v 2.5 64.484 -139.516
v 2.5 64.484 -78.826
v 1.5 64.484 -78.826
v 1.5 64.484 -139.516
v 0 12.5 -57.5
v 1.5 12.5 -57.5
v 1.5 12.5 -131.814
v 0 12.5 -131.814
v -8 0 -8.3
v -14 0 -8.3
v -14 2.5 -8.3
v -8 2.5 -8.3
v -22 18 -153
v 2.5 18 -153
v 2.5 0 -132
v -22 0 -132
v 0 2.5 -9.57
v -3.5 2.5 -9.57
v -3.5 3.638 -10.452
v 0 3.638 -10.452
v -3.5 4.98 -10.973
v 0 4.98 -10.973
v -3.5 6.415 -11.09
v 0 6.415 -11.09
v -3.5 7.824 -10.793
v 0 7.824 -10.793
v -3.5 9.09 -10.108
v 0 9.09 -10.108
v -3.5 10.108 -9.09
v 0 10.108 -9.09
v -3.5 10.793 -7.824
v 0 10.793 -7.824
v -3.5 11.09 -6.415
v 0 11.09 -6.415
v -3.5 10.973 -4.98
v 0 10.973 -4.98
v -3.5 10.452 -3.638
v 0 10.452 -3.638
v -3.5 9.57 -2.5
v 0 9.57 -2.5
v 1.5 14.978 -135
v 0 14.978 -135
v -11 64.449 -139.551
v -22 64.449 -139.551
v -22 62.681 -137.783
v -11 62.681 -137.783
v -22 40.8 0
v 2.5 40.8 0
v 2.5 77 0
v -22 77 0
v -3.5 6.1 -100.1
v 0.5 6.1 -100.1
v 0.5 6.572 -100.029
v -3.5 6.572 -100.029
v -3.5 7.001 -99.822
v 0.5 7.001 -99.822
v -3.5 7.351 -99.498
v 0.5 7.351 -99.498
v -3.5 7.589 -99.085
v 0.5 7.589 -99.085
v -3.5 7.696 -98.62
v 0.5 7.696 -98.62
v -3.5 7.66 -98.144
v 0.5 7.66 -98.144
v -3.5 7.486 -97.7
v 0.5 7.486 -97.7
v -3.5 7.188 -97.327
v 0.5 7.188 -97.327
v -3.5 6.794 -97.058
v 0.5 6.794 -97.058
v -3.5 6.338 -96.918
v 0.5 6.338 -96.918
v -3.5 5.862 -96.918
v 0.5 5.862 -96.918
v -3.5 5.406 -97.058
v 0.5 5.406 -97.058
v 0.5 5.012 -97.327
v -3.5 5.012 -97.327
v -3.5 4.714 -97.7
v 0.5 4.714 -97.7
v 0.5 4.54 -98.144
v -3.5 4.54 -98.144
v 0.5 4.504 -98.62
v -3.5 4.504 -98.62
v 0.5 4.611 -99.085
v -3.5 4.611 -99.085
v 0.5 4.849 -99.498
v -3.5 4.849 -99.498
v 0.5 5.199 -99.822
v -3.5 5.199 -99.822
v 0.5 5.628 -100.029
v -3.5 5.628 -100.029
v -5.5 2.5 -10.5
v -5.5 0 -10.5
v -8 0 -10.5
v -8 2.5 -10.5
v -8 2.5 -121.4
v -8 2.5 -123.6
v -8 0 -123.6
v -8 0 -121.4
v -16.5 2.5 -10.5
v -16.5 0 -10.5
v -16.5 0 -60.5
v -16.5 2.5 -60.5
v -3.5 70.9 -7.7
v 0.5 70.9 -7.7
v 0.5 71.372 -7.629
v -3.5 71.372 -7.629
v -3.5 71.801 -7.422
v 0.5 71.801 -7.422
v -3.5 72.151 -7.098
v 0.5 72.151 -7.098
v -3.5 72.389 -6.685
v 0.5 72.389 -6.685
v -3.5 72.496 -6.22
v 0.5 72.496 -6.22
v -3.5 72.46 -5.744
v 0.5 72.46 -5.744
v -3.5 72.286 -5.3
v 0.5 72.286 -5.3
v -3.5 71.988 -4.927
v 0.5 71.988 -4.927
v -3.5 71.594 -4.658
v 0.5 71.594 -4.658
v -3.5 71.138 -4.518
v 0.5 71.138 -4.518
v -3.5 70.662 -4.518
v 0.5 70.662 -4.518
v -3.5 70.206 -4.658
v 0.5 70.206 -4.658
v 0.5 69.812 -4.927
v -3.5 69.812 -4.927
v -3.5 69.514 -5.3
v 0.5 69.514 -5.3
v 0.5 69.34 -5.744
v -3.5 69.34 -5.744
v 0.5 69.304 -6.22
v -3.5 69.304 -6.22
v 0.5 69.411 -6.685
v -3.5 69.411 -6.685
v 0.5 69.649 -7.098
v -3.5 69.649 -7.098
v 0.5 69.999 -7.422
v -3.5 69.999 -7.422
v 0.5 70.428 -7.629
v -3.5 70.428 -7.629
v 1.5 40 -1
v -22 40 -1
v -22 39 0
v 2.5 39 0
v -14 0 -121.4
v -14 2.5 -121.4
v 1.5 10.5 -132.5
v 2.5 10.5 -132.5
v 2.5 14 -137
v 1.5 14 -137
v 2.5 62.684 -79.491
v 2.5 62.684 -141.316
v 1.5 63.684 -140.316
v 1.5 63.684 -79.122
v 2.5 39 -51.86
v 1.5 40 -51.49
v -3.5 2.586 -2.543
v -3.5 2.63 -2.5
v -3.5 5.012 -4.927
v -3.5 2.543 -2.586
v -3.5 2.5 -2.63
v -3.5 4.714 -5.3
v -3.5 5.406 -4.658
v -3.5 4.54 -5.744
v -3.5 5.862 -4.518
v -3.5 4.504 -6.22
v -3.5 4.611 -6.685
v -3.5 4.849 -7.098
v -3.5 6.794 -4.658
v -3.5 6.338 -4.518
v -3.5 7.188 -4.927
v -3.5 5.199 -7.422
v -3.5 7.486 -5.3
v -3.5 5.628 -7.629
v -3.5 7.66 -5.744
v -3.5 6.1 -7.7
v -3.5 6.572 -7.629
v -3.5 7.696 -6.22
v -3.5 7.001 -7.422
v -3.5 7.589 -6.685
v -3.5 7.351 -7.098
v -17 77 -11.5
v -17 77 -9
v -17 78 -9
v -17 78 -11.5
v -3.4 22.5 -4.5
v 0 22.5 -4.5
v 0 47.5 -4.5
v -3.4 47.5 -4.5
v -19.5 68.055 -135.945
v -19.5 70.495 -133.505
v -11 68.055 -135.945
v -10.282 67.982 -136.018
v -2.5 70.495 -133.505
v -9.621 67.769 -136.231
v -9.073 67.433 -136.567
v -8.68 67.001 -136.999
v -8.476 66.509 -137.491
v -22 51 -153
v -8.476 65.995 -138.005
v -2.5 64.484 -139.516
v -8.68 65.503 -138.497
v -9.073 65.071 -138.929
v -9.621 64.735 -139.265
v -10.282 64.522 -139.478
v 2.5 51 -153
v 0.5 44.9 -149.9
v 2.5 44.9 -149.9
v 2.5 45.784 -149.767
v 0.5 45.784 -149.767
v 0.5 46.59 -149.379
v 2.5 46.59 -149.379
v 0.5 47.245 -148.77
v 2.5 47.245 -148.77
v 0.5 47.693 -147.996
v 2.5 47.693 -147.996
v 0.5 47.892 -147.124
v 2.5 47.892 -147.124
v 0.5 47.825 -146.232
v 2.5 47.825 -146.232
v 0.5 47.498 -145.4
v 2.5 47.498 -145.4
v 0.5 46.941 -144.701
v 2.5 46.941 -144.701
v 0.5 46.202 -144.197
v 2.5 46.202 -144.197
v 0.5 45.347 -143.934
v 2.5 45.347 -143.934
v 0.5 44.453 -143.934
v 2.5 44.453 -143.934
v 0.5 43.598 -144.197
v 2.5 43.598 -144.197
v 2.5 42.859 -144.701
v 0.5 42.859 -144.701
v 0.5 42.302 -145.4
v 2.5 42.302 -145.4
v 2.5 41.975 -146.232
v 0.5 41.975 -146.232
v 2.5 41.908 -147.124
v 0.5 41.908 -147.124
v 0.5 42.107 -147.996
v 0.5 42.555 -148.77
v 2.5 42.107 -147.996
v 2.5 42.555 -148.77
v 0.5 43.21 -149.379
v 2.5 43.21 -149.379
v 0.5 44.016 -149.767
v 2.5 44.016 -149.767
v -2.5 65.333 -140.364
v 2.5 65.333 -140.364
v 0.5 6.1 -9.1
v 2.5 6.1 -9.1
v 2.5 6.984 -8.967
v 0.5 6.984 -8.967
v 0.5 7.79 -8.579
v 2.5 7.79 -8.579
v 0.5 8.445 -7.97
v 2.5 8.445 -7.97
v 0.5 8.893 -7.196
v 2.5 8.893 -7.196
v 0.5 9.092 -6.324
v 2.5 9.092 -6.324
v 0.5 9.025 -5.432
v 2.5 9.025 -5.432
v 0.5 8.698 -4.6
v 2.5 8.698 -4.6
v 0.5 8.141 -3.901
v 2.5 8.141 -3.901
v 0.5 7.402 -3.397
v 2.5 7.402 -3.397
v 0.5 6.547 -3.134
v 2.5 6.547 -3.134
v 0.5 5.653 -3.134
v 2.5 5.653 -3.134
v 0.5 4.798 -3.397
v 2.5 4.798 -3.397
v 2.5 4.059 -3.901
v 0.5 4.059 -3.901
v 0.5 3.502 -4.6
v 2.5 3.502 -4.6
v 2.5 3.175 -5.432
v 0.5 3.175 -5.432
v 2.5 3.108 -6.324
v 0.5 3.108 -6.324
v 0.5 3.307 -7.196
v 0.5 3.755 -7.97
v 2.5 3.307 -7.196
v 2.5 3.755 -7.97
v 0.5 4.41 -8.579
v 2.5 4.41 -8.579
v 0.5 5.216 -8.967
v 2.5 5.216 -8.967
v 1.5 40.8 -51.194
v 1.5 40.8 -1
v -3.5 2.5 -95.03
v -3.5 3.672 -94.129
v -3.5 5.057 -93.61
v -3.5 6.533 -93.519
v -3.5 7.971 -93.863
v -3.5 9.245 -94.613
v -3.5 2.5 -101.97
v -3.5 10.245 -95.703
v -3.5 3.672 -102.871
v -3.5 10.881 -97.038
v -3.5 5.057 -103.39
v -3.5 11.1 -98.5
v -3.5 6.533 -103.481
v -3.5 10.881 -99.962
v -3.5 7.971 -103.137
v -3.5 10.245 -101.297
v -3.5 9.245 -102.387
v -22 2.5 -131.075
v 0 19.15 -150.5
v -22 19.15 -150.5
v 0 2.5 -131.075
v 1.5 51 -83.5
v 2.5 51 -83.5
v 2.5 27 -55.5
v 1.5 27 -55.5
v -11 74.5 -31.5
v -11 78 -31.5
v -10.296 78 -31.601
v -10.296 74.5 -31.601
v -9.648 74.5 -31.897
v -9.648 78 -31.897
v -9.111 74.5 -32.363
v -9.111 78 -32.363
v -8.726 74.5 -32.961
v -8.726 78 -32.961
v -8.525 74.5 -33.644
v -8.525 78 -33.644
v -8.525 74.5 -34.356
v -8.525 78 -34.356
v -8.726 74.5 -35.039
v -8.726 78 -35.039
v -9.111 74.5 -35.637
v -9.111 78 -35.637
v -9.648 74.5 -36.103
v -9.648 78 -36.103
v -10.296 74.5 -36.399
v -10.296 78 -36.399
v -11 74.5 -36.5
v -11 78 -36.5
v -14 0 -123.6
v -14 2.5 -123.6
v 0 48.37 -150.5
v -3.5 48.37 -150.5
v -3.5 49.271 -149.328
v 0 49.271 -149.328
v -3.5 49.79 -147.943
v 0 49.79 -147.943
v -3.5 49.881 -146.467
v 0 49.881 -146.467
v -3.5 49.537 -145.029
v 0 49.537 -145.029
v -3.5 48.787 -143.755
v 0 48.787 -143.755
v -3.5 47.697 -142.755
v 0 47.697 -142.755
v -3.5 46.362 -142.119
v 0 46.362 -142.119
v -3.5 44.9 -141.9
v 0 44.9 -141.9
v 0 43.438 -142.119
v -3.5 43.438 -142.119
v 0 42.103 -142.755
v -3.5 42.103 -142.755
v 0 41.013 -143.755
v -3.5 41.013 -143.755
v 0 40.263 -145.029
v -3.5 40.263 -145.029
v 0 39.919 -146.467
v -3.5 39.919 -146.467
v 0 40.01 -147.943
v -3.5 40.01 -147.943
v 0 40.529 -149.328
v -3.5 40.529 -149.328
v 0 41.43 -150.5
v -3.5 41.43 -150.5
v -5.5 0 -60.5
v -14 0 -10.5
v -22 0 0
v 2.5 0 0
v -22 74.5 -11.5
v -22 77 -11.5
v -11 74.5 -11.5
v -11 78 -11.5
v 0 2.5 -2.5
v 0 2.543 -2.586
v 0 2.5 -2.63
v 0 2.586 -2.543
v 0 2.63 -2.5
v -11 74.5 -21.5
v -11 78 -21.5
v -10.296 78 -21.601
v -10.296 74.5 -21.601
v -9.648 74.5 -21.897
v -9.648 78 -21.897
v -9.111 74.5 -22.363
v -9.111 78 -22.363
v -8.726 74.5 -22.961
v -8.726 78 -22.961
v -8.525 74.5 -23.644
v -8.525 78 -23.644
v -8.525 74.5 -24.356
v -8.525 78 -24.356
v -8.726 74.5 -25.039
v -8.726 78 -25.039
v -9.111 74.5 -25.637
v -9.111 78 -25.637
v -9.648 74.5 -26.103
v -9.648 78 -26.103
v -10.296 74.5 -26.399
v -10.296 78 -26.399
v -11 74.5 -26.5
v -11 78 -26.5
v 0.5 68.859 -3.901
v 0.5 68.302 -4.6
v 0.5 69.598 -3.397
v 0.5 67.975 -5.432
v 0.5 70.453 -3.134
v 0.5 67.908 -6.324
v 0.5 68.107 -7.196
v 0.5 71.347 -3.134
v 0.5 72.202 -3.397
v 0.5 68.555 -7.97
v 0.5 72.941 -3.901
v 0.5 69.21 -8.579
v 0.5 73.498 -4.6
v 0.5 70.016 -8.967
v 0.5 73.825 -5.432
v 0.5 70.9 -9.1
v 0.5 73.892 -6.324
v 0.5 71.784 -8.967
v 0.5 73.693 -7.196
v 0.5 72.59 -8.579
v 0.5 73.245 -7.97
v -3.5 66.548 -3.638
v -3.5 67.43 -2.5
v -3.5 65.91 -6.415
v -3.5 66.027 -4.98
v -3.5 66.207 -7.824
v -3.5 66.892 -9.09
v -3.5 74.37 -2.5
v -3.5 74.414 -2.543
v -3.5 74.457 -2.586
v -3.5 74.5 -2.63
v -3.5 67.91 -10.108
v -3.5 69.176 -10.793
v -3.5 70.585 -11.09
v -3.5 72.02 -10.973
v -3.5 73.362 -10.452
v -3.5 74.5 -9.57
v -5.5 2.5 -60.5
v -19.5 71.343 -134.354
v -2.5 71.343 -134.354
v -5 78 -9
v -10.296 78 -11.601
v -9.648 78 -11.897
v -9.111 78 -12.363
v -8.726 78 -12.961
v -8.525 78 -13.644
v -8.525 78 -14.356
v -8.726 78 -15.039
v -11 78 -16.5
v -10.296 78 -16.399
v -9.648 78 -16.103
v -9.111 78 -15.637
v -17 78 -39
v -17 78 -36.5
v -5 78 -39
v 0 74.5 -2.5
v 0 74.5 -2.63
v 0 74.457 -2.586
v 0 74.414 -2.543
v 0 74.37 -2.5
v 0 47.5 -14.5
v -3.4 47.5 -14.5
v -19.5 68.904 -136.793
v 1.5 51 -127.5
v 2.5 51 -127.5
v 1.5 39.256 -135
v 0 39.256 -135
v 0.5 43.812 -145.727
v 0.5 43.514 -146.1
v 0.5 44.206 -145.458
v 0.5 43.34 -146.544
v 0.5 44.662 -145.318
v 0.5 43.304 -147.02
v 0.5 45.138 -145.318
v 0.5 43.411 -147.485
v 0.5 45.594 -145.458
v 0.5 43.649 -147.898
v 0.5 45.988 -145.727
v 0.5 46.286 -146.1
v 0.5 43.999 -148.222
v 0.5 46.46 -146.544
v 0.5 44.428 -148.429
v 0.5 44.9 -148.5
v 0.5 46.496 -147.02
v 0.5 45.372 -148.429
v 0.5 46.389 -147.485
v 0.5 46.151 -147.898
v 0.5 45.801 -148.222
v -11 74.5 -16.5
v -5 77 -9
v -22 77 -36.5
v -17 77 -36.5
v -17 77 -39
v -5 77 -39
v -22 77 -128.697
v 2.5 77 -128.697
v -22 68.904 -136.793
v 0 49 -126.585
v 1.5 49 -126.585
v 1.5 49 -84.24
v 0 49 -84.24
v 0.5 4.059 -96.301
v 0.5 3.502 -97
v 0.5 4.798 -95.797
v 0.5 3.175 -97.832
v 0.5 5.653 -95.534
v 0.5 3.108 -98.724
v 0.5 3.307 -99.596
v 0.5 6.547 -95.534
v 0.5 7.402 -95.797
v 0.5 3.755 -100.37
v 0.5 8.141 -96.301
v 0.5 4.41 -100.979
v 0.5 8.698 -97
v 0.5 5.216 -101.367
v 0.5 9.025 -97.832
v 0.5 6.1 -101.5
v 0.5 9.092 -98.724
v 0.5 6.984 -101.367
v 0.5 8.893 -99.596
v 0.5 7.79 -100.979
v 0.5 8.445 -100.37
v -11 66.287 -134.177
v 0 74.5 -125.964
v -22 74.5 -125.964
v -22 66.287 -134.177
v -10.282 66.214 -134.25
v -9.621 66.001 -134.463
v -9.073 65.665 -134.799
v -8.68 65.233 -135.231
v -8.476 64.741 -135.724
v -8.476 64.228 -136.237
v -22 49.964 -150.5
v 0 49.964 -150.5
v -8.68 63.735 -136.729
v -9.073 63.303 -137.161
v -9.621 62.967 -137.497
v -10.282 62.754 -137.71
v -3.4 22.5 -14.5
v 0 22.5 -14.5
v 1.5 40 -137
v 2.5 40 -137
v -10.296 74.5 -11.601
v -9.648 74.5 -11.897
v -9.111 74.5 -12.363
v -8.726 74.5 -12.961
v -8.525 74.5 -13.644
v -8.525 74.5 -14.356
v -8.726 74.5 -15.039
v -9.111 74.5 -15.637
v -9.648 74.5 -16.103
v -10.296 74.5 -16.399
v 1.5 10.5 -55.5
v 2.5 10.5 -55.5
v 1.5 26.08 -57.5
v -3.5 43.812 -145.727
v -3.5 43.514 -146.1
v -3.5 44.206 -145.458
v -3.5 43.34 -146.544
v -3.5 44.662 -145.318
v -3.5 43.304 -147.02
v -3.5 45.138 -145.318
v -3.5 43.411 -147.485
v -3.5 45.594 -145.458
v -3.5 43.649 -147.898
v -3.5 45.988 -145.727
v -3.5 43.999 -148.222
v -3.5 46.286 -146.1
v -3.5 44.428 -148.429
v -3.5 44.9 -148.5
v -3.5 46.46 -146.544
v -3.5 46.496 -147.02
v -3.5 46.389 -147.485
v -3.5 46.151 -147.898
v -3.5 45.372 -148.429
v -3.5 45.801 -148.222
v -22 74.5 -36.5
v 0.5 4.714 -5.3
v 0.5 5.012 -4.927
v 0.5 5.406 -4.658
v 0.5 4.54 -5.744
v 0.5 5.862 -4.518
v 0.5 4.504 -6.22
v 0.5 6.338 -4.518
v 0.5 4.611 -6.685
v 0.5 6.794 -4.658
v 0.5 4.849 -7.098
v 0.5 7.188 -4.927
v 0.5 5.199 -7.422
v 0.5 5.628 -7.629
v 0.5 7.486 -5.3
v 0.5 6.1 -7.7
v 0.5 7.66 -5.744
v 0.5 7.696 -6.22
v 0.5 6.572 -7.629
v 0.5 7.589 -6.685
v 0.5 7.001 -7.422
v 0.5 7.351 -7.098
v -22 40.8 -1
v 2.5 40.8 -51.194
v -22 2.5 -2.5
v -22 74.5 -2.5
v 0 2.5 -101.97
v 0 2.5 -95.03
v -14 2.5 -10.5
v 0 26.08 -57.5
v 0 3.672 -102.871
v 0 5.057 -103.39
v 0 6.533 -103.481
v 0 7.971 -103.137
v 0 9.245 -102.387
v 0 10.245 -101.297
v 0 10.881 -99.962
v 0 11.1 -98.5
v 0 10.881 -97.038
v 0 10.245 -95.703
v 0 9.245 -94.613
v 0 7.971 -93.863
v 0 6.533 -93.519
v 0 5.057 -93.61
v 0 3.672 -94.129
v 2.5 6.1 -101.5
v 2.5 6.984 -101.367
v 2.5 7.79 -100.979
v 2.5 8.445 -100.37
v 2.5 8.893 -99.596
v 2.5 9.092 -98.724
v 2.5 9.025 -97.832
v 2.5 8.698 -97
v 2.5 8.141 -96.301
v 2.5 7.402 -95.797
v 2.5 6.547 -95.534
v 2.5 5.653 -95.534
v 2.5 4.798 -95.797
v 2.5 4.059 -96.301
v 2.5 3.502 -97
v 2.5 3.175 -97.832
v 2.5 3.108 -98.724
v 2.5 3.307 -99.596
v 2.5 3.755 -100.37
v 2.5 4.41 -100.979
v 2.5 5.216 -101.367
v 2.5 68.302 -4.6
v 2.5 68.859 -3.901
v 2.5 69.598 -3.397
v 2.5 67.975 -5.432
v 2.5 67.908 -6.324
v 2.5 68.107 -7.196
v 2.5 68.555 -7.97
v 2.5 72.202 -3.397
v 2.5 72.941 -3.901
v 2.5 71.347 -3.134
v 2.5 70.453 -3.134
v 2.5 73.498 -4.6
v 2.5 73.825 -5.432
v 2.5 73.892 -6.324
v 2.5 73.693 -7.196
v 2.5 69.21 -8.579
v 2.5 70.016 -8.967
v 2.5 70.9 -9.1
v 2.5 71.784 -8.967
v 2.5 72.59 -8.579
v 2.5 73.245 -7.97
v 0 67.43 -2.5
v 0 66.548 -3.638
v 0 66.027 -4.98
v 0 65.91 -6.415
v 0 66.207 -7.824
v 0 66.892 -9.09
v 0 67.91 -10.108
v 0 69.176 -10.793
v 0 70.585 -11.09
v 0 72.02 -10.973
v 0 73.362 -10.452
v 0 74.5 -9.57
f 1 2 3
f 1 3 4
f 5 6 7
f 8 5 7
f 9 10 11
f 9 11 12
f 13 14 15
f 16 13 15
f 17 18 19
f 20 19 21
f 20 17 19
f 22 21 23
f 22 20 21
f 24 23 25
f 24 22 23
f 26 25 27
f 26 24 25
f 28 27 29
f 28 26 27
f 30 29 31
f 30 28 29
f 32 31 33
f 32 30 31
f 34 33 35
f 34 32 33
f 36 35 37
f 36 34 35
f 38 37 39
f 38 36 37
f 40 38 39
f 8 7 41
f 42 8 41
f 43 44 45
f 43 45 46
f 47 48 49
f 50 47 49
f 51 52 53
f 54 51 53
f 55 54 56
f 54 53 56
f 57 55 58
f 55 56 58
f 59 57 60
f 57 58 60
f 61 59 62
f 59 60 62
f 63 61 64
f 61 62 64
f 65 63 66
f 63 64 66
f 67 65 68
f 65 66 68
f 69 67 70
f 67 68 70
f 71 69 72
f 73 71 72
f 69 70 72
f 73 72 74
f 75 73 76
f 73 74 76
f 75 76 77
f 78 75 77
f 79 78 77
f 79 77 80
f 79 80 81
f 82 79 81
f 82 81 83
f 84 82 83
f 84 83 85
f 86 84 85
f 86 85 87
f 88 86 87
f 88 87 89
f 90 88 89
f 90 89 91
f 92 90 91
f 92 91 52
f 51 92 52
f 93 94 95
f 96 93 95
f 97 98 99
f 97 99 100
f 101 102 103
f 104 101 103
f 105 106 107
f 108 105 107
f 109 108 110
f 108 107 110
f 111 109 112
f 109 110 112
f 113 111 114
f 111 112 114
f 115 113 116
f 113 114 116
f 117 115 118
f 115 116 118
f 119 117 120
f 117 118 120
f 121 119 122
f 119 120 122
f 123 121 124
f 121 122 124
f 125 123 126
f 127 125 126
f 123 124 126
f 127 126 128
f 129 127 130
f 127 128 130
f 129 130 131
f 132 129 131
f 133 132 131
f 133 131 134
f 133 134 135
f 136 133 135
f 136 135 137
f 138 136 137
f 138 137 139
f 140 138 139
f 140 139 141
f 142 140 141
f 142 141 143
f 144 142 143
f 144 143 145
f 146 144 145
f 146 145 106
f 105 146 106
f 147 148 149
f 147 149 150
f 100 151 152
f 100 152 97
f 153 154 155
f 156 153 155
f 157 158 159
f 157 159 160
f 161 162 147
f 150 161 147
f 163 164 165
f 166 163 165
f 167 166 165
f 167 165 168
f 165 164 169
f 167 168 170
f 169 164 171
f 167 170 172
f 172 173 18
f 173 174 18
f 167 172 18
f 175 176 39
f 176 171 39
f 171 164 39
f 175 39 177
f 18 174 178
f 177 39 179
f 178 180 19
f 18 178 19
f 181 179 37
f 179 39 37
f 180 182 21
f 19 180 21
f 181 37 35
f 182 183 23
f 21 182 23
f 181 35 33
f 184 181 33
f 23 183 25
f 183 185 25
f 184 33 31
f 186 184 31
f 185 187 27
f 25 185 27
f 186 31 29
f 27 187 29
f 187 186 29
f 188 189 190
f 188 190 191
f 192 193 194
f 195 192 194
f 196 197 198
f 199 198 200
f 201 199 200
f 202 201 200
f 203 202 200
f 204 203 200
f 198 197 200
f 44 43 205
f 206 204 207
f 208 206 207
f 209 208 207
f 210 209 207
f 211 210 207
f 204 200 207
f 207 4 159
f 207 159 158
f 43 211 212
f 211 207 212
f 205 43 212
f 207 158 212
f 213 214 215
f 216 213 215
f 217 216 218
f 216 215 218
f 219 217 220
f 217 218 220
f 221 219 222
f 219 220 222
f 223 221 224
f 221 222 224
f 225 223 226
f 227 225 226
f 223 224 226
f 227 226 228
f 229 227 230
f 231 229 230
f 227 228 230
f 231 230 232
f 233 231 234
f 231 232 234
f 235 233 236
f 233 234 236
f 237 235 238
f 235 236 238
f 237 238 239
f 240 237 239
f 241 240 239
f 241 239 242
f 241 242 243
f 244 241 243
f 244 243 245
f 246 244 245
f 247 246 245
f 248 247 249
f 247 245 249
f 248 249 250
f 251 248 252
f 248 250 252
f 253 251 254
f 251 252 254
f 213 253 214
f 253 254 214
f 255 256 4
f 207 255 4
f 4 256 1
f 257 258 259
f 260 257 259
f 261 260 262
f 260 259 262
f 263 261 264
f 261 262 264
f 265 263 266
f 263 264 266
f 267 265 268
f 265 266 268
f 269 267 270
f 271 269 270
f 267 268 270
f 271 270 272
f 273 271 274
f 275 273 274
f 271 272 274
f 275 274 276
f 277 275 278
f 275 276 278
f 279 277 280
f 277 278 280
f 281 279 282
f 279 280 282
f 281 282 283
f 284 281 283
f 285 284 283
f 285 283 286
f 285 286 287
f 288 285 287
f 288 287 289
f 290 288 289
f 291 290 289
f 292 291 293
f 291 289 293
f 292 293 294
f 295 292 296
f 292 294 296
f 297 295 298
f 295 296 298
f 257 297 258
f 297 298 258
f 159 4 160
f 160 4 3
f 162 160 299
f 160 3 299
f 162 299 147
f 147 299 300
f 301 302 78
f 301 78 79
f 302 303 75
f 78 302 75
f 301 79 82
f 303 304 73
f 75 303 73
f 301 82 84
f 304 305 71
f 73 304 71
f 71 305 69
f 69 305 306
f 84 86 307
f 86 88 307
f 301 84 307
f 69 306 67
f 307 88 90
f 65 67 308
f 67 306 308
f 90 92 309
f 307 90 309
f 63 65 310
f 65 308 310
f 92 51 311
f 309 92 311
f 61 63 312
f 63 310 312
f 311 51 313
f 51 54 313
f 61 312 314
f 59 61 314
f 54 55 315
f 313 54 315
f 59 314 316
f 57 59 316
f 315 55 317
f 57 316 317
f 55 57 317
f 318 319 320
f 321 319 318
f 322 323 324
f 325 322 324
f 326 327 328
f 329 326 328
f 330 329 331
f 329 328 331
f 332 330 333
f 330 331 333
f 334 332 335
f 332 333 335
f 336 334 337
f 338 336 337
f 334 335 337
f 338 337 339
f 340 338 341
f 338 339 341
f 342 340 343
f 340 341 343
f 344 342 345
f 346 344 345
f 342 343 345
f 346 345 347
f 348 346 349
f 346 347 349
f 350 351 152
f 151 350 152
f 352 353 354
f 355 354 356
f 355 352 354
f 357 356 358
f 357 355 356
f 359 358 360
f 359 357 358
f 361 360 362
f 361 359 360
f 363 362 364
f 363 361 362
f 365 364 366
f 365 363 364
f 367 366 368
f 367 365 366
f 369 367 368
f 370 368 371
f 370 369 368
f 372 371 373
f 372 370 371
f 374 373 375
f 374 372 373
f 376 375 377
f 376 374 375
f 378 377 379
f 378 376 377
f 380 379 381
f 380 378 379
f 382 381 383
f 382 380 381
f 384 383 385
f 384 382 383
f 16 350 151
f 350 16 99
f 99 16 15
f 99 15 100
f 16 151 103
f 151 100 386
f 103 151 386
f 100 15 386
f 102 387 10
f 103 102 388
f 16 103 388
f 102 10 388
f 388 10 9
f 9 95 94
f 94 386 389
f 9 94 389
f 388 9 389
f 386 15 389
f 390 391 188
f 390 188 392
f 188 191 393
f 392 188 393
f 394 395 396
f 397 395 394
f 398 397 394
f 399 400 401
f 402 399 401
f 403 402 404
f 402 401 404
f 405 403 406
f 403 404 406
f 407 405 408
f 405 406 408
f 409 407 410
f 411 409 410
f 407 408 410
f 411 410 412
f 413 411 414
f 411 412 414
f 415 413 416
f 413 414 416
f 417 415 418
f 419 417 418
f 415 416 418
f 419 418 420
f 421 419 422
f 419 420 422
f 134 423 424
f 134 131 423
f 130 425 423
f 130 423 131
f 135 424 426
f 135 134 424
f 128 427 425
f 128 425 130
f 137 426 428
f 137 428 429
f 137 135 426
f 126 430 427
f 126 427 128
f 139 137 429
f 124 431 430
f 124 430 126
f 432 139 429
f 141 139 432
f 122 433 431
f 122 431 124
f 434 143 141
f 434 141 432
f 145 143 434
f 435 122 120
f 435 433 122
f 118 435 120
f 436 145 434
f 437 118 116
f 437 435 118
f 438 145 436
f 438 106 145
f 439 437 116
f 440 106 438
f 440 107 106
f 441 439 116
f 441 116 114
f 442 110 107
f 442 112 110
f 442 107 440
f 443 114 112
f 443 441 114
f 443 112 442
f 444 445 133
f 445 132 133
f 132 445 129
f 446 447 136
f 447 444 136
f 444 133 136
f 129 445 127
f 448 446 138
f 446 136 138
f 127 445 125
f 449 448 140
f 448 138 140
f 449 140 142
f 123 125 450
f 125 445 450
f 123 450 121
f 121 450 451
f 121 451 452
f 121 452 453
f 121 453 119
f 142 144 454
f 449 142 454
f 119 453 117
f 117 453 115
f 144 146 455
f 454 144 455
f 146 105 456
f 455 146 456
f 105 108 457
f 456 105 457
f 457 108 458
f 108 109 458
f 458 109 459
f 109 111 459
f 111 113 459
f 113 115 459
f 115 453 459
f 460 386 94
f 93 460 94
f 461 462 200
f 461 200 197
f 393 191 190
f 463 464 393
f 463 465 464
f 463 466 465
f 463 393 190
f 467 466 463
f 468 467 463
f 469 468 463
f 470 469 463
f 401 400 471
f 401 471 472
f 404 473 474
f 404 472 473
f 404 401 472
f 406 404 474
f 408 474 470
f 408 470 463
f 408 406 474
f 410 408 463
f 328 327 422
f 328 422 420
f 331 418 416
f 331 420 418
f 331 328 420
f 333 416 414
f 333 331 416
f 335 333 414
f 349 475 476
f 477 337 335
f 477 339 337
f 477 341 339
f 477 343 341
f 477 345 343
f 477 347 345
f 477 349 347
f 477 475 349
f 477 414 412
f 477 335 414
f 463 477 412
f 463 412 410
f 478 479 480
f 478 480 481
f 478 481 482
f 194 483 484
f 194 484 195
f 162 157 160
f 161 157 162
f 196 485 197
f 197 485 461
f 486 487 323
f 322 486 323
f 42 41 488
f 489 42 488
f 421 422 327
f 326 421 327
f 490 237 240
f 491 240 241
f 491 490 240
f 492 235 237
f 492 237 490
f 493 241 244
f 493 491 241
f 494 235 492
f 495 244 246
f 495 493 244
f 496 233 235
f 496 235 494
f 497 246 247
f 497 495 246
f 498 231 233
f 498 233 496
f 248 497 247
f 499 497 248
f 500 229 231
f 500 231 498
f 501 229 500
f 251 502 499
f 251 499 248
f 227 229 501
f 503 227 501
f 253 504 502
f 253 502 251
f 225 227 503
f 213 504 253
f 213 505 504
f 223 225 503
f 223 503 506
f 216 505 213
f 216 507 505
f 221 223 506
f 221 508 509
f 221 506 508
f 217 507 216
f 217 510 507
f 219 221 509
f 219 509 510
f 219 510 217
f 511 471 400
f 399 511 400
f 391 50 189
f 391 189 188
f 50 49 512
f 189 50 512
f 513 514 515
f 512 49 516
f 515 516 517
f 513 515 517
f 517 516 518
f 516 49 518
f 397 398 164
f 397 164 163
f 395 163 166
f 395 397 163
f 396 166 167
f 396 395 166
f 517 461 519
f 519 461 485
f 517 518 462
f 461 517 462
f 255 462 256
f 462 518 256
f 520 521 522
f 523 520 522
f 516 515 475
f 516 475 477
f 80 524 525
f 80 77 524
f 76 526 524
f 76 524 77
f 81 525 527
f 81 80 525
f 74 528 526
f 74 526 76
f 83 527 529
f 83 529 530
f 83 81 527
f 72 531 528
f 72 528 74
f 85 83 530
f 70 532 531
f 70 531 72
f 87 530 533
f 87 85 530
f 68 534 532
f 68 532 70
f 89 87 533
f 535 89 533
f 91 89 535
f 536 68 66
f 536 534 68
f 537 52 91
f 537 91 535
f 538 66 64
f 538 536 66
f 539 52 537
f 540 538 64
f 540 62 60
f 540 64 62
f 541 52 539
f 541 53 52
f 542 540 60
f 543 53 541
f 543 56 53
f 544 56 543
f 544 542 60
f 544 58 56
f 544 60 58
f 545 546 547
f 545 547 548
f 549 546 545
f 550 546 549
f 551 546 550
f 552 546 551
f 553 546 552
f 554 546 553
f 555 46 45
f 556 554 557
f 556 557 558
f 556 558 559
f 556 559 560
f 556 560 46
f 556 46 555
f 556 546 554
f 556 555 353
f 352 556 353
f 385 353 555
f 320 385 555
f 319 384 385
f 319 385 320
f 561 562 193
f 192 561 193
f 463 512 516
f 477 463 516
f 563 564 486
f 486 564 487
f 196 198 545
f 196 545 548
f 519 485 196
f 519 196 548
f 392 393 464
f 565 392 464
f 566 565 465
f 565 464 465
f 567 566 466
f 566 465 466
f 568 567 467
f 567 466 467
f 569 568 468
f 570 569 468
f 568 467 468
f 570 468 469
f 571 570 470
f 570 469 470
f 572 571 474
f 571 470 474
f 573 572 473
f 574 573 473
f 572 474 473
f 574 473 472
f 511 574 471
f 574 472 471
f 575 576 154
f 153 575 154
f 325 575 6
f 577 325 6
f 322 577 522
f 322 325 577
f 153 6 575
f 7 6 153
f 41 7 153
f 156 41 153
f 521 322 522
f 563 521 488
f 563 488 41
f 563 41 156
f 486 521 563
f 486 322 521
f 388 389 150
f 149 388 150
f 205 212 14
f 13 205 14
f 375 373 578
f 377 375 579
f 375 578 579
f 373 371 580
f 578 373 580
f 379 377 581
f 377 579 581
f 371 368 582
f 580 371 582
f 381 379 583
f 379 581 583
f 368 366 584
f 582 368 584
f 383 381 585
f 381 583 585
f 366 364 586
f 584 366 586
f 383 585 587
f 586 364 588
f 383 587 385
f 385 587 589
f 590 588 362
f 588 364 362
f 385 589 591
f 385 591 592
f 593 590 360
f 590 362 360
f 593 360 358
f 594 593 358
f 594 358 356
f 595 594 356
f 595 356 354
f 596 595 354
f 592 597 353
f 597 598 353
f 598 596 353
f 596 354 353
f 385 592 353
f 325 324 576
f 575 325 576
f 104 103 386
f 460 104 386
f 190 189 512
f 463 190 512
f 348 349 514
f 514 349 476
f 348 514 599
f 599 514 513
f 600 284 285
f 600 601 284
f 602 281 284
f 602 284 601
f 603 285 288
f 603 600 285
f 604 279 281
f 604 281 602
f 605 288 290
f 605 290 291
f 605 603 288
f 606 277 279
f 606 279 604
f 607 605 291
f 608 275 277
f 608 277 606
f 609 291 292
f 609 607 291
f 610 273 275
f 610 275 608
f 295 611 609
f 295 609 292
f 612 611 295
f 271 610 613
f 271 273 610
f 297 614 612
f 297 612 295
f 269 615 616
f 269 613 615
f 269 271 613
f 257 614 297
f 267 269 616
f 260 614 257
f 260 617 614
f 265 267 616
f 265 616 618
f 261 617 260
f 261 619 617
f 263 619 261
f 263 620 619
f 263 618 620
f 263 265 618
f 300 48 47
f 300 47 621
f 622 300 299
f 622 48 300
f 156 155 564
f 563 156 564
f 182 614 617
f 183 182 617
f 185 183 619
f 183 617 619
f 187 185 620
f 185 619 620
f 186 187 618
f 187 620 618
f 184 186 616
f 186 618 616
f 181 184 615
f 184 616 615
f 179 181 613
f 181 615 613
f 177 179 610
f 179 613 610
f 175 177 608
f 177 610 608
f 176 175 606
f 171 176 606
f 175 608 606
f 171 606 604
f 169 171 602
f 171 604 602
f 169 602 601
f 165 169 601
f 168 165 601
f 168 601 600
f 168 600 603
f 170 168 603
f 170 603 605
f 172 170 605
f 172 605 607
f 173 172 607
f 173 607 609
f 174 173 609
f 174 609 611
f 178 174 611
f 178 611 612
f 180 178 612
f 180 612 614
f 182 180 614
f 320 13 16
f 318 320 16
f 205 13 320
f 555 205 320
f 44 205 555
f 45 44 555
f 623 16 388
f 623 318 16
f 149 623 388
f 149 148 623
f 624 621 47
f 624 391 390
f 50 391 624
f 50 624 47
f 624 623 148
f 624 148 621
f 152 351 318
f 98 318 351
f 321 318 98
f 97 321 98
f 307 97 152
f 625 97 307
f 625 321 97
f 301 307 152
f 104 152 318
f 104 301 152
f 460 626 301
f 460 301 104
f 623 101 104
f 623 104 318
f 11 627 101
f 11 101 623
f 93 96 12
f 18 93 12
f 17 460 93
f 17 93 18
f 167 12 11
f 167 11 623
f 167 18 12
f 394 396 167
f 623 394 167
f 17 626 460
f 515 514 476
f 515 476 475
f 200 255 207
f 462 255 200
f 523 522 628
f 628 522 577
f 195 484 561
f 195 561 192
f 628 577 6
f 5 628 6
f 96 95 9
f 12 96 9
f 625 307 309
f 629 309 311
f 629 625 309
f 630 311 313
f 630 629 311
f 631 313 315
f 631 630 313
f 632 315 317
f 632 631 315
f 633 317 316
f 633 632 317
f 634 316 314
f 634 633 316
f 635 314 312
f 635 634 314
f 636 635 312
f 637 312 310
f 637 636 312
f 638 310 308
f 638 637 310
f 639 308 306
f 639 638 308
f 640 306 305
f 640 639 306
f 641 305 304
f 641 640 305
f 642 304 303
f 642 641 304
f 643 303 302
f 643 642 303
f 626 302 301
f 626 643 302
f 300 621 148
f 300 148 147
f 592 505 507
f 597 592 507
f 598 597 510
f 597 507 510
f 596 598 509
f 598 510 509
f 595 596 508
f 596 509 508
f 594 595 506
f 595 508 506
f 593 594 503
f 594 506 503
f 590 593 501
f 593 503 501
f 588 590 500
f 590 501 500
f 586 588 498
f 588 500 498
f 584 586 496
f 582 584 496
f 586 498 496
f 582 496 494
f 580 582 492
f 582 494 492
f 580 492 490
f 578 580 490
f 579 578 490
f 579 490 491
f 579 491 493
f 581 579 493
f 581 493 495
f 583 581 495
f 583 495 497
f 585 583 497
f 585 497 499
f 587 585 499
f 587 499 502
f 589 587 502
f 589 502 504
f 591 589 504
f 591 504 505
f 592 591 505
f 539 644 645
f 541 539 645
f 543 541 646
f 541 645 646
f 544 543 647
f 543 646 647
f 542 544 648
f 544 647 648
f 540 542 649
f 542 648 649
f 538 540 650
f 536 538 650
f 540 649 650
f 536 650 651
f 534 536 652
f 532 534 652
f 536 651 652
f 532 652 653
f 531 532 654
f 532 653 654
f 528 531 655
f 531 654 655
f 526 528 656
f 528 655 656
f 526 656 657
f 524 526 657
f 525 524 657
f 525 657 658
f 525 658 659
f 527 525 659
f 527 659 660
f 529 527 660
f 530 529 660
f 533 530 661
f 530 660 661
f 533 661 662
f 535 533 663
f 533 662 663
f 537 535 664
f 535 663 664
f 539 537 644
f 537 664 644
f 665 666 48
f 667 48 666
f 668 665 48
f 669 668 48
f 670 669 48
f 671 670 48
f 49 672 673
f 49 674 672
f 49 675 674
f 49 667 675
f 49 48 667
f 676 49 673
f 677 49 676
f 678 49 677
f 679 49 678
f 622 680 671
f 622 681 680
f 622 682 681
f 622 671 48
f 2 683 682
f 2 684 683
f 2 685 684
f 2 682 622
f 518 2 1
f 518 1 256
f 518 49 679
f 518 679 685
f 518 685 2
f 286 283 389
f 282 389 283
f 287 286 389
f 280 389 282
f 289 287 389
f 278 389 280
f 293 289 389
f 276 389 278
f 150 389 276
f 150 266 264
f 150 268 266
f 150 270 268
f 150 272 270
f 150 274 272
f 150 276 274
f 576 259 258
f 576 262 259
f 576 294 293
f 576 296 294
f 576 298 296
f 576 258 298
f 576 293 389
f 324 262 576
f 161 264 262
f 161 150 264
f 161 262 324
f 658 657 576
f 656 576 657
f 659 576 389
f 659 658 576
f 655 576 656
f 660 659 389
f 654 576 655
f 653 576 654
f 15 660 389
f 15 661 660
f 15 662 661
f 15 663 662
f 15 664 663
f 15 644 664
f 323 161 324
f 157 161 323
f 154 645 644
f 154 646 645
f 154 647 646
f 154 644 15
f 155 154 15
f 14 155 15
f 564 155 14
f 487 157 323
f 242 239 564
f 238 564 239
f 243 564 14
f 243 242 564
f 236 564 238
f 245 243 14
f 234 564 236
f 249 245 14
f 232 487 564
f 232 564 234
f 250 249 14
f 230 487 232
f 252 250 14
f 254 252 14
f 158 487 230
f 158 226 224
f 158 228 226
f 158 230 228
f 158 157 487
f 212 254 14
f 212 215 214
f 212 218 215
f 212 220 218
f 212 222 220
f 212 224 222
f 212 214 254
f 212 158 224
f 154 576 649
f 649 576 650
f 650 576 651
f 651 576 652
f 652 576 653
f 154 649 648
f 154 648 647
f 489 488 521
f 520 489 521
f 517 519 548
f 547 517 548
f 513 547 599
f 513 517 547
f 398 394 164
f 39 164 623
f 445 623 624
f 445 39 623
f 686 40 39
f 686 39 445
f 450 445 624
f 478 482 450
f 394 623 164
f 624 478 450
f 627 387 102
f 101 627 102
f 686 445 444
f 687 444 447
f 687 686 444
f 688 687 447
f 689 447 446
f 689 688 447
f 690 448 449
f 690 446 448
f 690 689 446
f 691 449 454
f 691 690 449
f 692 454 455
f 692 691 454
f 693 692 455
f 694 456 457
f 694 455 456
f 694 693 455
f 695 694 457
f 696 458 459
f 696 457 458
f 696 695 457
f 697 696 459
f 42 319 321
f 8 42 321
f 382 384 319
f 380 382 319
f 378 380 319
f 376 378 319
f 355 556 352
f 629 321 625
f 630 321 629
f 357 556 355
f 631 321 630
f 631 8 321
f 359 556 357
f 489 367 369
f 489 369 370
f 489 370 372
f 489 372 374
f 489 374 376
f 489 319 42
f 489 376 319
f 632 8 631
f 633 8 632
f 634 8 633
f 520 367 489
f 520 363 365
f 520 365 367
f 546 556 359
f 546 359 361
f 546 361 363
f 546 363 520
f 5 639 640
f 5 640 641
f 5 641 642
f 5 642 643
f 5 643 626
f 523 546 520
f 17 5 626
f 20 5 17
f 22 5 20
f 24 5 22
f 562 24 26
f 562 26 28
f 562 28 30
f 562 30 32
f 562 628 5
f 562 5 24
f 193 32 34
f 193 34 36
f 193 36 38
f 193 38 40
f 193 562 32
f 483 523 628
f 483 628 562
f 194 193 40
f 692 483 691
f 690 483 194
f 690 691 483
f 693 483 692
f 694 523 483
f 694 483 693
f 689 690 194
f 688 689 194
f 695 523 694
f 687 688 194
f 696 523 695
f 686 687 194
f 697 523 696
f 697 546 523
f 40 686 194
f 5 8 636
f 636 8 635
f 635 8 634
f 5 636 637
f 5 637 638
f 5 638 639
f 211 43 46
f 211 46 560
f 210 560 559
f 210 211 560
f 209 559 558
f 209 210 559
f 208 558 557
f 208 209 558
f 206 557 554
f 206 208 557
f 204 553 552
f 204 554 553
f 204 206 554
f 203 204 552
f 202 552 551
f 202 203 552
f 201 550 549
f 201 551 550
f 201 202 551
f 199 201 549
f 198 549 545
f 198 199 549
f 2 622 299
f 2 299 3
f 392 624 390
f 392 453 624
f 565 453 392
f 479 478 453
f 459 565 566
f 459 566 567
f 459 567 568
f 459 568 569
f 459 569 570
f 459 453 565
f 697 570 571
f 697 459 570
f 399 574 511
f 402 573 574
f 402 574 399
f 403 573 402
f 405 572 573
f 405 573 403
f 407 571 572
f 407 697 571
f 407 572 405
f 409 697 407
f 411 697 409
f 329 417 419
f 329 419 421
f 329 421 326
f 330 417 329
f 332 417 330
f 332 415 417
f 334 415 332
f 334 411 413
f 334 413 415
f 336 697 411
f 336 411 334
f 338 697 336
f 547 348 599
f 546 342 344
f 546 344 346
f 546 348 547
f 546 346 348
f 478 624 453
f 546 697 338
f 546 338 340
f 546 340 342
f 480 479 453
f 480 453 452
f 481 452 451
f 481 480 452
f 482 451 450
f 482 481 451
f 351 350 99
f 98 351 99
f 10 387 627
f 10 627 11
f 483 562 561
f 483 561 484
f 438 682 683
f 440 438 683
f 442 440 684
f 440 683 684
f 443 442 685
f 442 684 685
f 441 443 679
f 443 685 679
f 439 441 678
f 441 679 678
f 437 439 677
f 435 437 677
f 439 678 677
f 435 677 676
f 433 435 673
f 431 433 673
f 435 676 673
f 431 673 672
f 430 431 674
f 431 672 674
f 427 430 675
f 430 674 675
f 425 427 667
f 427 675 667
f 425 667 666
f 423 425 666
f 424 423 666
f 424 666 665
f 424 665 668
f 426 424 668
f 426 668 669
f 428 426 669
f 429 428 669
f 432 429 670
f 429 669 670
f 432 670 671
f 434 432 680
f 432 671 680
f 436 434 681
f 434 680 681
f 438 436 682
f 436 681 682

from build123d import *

# Parameters (mm, degrees)
BASE_DEPTH            = 2.5
BOSS_EXTRUDE6_DEPTH   = 22
SKETCH17_W            = 12
SKETCH17_H            = 30
BOSS_EXTRUDE8_DEPTH   = 1
CUT_EXTRUDE2_REACH    = 175.139
BOSS_EXTRUDE9_DEPTH   = 24.5
SKETCH20_W            = 17
SKETCH20_H            = 8.5
CUT_EXTRUDE5_DEPTH    = 1.2
CUT_EXTRUDE6_DEPTH    = 5
SKETCH28_R            = 5
BOSS_EXTRUDE11_DEPTH  = 6
SKETCH29_R            = 3
CUT_EXTRUDE11_DEPTH   = 2
CUT_EXTRUDE12_REACH   = 175.203
SKETCH30_R            = 1.6
SKETCH31_W            = 10
SKETCH31_H            = 25
BATTERY_SUPPORT_DEPTH = 3.4
CUT_EXTRUDE9_DEPTH    = 1
CUT_EXTRUDE10_REACH   = 175.336
CUT_EXTRUDE13_DEPTH   = 1
SKETCH33_W            = 23.5
SKETCH33_H            = 0.8
CUT_EXTRUDE14_DEPTH   = 1
CHAMFER1_SIZE         = 1
CUT_EXTRUDE7_REACH    = 175.139
SKETCH23_W            = 6
SKETCH23_H            = 2.2


with BuildPart() as part:
    # Sketch1 → Base (new body)
    with BuildSketch(Plane(origin=(0, 0, 0), x_dir=(0, 0, -1), z_dir=(1, 0, 0))):
        Polygon((0, 0), (0, 77), (127, 77), (153, 51), (153, 18), (132, 0), align=None)
    extrude(amount=BASE_DEPTH)

    # Sketch11 → Boss-Extrude6 (add)
    with BuildSketch(Plane.ZY):
        Polygon((-153, 18), (-132, 0), (0, 0), (0, 77), (-127, 77), (-153, 51), align=None)
        Polygon((-150.5, 19.149837306), (-131.075189809, 2.5), (-2.5, 2.5), (-2.5, 74.5), (-125.964466094, 74.5), (-150.5, 49.964466094), align=None, mode=Mode.SUBTRACT)
    extrude(amount=BOSS_EXTRUDE6_DEPTH)

    # Sketch17 → Boss-Extrude8 (add)
    with BuildSketch(Plane(origin=(0, 77, 0), x_dir=(1, 0, 0), z_dir=(0, 1, 0))):
        with Locations((-11, 24)):
            Rectangle(SKETCH17_W, SKETCH17_H)
    extrude(amount=BOSS_EXTRUDE8_DEPTH)

    # Sketch13 → Cut-Extrude2 (cut, up to next)
    with BuildSketch(Plane(origin=(0, 78, 0), x_dir=(1, 0, 0), z_dir=(0, 1, 0)), mode=Mode.PRIVATE) as cut_extrude2_sk1:
        with BuildLine():
            Line((-22, 11.5), (-11, 11.5))
            ThreePointArc((-11, 11.5), (-8.5, 14), (-11, 16.5))
            Line((-11, 16.5), (-11, 21.5))
            ThreePointArc((-11, 21.5), (-8.5, 24), (-11, 26.5))
            Line((-11, 26.5), (-11, 31.5))
            ThreePointArc((-11, 31.5), (-8.5, 34), (-11, 36.5))
            Line((-11, 36.5), (-22, 36.5))
            Line((-22, 36.5), (-22, 11.5))
        make_face()
    cut_extrude2_tool1 = extrude(cut_extrude2_sk1.sketch, amount=-CUT_EXTRUDE2_REACH, mode=Mode.PRIVATE) & part.part
    add(cut_extrude2_tool1.solids().sort_by_distance((-15.865292, 78, -24))[0], mode=Mode.SUBTRACT)

    # Sketch19 → Boss-Extrude9 (add)
    with BuildSketch(Plane(origin=(2.5, 0, 0), x_dir=(0, 0, -1), z_dir=(1, 0, 0))):
        Polygon((127, 77), (128.697056275, 77), (140.364318164, 65.33273811), (139.515790027, 64.484209973), align=None)
    extrude(amount=-BOSS_EXTRUDE9_DEPTH)

    # Sketch20 → Cut-Extrude5 (cut)
    with BuildSketch(Plane(origin=(0, 102.848528137, -102.848528137), x_dir=(-1, 0, 0), z_dir=(0, 0.7071067811865467, -0.7071067811865485))):
        with Locations((11, -48.805339059)):
            Rectangle(SKETCH20_W, SKETCH20_H)
    extrude(amount=-CUT_EXTRUDE5_DEPTH, mode=Mode.SUBTRACT)

    # Sketch21 → Cut-Extrude6 (cut, symmetric)
    with BuildSketch(Plane(origin=(0, 102, -102), x_dir=(-1, 0, 0), z_dir=(0, 0.7071067811865478, -0.7071067811865472))):
        with BuildLine():
            Line((11, -48.005339059), (22, -48.005339059))
            Line((22, -48.005339059), (22, -53.105339059))
            Line((22, -53.105339059), (11, -53.105339059))
            ThreePointArc((11, -53.105339059), (8.45, -50.555339059), (11, -48.005339059))
        make_face()
    extrude(amount=CUT_EXTRUDE6_DEPTH, both=True, mode=Mode.SUBTRACT)

    # Sketch28 → Boss-Extrude11 (add)
    with BuildSketch(Plane(origin=(2.5, 0, 0), x_dir=(0, 0, -1), z_dir=(1, 0, 0))):
        with Locations((6.1, 70.9)):
            Circle(SKETCH28_R)
        with Locations((146.9, 44.9)):
            Circle(SKETCH28_R)
        with Locations((98.5, 6.1)):
            Circle(SKETCH28_R)
        with Locations((6.1, 6.1)):
            Circle(SKETCH28_R)
    extrude(amount=-BOSS_EXTRUDE11_DEPTH)

    # Sketch29 → Cut-Extrude11 (cut)
    with BuildSketch(Plane(origin=(2.5, 0, 0), x_dir=(0, 0, -1), z_dir=(1, 0, 0))):
        with Locations((6.1, 70.9)):
            Circle(SKETCH29_R)
        with Locations((146.9, 44.9)):
            Circle(SKETCH29_R)
        with Locations((98.5, 6.1)):
            Circle(SKETCH29_R)
        with Locations((6.1, 6.1)):
            Circle(SKETCH29_R)
    extrude(amount=-CUT_EXTRUDE11_DEPTH, mode=Mode.SUBTRACT)

    # Sketch30 → Cut-Extrude12 (cut, up to next)
    with BuildSketch(Plane(origin=(0.5, 0, 0), x_dir=(0, 0, -1), z_dir=(1, 0, 0)), mode=Mode.PRIVATE) as cut_extrude12_sk1:
        with Locations((6.1, 70.9)):
            Circle(SKETCH30_R)
    cut_extrude12_tool1 = extrude(cut_extrude12_sk1.sketch, amount=-CUT_EXTRUDE12_REACH, mode=Mode.PRIVATE) & part.part
    # Sketch30 → Cut-Extrude12 (cut, up to next)
    with BuildSketch(Plane(origin=(0.5, 0, 0), x_dir=(0, 0, -1), z_dir=(1, 0, 0)), mode=Mode.PRIVATE) as cut_extrude12_sk2:
        with Locations((6.1, 6.1)):
            Circle(SKETCH30_R)
    cut_extrude12_tool2 = extrude(cut_extrude12_sk2.sketch, amount=-CUT_EXTRUDE12_REACH, mode=Mode.PRIVATE) & part.part
    # Sketch30 → Cut-Extrude12 (cut, up to next)
    with BuildSketch(Plane(origin=(0.5, 0, 0), x_dir=(0, 0, -1), z_dir=(1, 0, 0)), mode=Mode.PRIVATE) as cut_extrude12_sk3:
        with Locations((146.9, 44.9)):
            Circle(SKETCH30_R)
    cut_extrude12_tool3 = extrude(cut_extrude12_sk3.sketch, amount=-CUT_EXTRUDE12_REACH, mode=Mode.PRIVATE) & part.part
    # Sketch30 → Cut-Extrude12 (cut, up to next)
    with BuildSketch(Plane(origin=(0.5, 0, 0), x_dir=(0, 0, -1), z_dir=(1, 0, 0)), mode=Mode.PRIVATE) as cut_extrude12_sk4:
        with Locations((98.5, 6.1)):
            Circle(SKETCH30_R)
    cut_extrude12_tool4 = extrude(cut_extrude12_sk4.sketch, amount=-CUT_EXTRUDE12_REACH, mode=Mode.PRIVATE) & part.part
    add(cut_extrude12_tool1.solids().sort_by_distance((0.5, 70.9, -6.1))[0], mode=Mode.SUBTRACT)
    add(cut_extrude12_tool2.solids().sort_by_distance((0.5, 6.1, -6.1))[0], mode=Mode.SUBTRACT)
    add(cut_extrude12_tool3.solids().sort_by_distance((0.5, 44.9, -146.9))[0], mode=Mode.SUBTRACT)
    add(cut_extrude12_tool4.solids().sort_by_distance((0.5, 6.1, -98.5))[0], mode=Mode.SUBTRACT)

    # Sketch31 → Battery_Support (add)
    with BuildSketch(Plane.ZY):
        with Locations((-9.5, 35)):
            Rectangle(SKETCH31_W, SKETCH31_H)
    extrude(amount=BATTERY_SUPPORT_DEPTH)

    # Sketch25 → Cut-Extrude9 (cut)
    with BuildSketch(Plane(origin=(2.5, 0, 0), x_dir=(0, 0, -1), z_dir=(1, 0, 0))):
        Polygon((55.5, 10.5), (132.5, 10.5), (137, 14), (137, 40), (127.5, 51), (83.5, 51), (55.5, 27), align=None)
    extrude(amount=-CUT_EXTRUDE9_DEPTH, mode=Mode.SUBTRACT)

    # Sketch26 → Cut-Extrude10 (cut, up to next)
    with BuildSketch(Plane(origin=(1.5, 0, 0), x_dir=(0, 0, -1), z_dir=(1, 0, 0)), mode=Mode.PRIVATE) as cut_extrude10_sk1:
        Polygon((57.5, 26.080130155), (57.5, 12.5), (131.8137845, 12.5), (135, 14.978167611), (135, 39.255906978), (126.584646936, 49), (84.239848152, 49), align=None)
    cut_extrude10_tool1 = extrude(cut_extrude10_sk1.sketch, amount=-CUT_EXTRUDE10_REACH, mode=Mode.PRIVATE) & part.part
    add(cut_extrude10_tool1.solids().sort_by_distance((1.5, 29.217081, -99.285701))[0], mode=Mode.SUBTRACT)

    # Sketch32 → Cut-Extrude13 (cut)
    with BuildSketch(Plane(origin=(2.5, 0, 0), x_dir=(0, 0, -1), z_dir=(1, 0, 0))):
        Polygon((144.515790027, 63.684209973), (79.121592497, 63.684209973), (51.490014195, 40), (0, 40), (0, 40.8), (51.194074935, 40.8), (78.825653236, 64.484209973), (144.515790027, 64.484209973), align=None)
    extrude(amount=-CUT_EXTRUDE13_DEPTH, mode=Mode.SUBTRACT)

    # Sketch33 → Cut-Extrude14 (cut)
    with BuildSketch(Plane.XY):
        with Locations((-10.25, 40.4)):
            Rectangle(SKETCH33_W, SKETCH33_H)
    extrude(amount=-CUT_EXTRUDE14_DEPTH, mode=Mode.SUBTRACT)

    # Chamfer1
    chamfer1_edges = [part.edges().sort_by_distance(p)[0] for p in [
        (-9.75, 40, 0),
        (2.5, 40, -25.745007098),
        (2.5, 51.842104986, -65.305803346),
        (2.5, 63.684209973, -109.718691262),
    ]]
    chamfer(chamfer1_edges, length=CHAMFER1_SIZE - 0.0001)  # a hair under: the kernel refuses the full size

    # Sketch23 → Cut-Extrude7 (cut, up to next)
    with BuildSketch(Plane.XZ, mode=Mode.PRIVATE) as cut_extrude7_sk1:
        Polygon((-5.5, -10.5), (-8, -10.5), (-14, -10.5), (-16.5, -10.5), (-16.5, -60.5), (-5.5, -60.5), align=None)
    cut_extrude7_tool1 = extrude(cut_extrude7_sk1.sketch, amount=-CUT_EXTRUDE7_REACH, mode=Mode.PRIVATE) & part.part
    # Sketch23 → Cut-Extrude7 (cut, up to next)
    with BuildSketch(Plane.XZ, mode=Mode.PRIVATE) as cut_extrude7_sk2:
        with Locations((-11, -9.4)):
            Rectangle(SKETCH23_W, SKETCH23_H)
    cut_extrude7_tool2 = extrude(cut_extrude7_sk2.sketch, amount=-CUT_EXTRUDE7_REACH, mode=Mode.PRIVATE) & part.part
    # Sketch23 → Cut-Extrude7 (cut, up to next)
    with BuildSketch(Plane.XZ, mode=Mode.PRIVATE) as cut_extrude7_sk3:
        with Locations((-11, -122.5)):
            Rectangle(SKETCH23_W, SKETCH23_H)
    cut_extrude7_tool3 = extrude(cut_extrude7_sk3.sketch, amount=-CUT_EXTRUDE7_REACH, mode=Mode.PRIVATE) & part.part
    add(cut_extrude7_tool1.solids().sort_by_distance((-11, 0, -35.5))[0], mode=Mode.SUBTRACT)
    add(cut_extrude7_tool2.solids().sort_by_distance((-11, 0, -9.4))[0], mode=Mode.SUBTRACT)
    add(cut_extrude7_tool3.solids().sort_by_distance((-11, 0, -122.5))[0], mode=Mode.SUBTRACT)


solid = part.part
